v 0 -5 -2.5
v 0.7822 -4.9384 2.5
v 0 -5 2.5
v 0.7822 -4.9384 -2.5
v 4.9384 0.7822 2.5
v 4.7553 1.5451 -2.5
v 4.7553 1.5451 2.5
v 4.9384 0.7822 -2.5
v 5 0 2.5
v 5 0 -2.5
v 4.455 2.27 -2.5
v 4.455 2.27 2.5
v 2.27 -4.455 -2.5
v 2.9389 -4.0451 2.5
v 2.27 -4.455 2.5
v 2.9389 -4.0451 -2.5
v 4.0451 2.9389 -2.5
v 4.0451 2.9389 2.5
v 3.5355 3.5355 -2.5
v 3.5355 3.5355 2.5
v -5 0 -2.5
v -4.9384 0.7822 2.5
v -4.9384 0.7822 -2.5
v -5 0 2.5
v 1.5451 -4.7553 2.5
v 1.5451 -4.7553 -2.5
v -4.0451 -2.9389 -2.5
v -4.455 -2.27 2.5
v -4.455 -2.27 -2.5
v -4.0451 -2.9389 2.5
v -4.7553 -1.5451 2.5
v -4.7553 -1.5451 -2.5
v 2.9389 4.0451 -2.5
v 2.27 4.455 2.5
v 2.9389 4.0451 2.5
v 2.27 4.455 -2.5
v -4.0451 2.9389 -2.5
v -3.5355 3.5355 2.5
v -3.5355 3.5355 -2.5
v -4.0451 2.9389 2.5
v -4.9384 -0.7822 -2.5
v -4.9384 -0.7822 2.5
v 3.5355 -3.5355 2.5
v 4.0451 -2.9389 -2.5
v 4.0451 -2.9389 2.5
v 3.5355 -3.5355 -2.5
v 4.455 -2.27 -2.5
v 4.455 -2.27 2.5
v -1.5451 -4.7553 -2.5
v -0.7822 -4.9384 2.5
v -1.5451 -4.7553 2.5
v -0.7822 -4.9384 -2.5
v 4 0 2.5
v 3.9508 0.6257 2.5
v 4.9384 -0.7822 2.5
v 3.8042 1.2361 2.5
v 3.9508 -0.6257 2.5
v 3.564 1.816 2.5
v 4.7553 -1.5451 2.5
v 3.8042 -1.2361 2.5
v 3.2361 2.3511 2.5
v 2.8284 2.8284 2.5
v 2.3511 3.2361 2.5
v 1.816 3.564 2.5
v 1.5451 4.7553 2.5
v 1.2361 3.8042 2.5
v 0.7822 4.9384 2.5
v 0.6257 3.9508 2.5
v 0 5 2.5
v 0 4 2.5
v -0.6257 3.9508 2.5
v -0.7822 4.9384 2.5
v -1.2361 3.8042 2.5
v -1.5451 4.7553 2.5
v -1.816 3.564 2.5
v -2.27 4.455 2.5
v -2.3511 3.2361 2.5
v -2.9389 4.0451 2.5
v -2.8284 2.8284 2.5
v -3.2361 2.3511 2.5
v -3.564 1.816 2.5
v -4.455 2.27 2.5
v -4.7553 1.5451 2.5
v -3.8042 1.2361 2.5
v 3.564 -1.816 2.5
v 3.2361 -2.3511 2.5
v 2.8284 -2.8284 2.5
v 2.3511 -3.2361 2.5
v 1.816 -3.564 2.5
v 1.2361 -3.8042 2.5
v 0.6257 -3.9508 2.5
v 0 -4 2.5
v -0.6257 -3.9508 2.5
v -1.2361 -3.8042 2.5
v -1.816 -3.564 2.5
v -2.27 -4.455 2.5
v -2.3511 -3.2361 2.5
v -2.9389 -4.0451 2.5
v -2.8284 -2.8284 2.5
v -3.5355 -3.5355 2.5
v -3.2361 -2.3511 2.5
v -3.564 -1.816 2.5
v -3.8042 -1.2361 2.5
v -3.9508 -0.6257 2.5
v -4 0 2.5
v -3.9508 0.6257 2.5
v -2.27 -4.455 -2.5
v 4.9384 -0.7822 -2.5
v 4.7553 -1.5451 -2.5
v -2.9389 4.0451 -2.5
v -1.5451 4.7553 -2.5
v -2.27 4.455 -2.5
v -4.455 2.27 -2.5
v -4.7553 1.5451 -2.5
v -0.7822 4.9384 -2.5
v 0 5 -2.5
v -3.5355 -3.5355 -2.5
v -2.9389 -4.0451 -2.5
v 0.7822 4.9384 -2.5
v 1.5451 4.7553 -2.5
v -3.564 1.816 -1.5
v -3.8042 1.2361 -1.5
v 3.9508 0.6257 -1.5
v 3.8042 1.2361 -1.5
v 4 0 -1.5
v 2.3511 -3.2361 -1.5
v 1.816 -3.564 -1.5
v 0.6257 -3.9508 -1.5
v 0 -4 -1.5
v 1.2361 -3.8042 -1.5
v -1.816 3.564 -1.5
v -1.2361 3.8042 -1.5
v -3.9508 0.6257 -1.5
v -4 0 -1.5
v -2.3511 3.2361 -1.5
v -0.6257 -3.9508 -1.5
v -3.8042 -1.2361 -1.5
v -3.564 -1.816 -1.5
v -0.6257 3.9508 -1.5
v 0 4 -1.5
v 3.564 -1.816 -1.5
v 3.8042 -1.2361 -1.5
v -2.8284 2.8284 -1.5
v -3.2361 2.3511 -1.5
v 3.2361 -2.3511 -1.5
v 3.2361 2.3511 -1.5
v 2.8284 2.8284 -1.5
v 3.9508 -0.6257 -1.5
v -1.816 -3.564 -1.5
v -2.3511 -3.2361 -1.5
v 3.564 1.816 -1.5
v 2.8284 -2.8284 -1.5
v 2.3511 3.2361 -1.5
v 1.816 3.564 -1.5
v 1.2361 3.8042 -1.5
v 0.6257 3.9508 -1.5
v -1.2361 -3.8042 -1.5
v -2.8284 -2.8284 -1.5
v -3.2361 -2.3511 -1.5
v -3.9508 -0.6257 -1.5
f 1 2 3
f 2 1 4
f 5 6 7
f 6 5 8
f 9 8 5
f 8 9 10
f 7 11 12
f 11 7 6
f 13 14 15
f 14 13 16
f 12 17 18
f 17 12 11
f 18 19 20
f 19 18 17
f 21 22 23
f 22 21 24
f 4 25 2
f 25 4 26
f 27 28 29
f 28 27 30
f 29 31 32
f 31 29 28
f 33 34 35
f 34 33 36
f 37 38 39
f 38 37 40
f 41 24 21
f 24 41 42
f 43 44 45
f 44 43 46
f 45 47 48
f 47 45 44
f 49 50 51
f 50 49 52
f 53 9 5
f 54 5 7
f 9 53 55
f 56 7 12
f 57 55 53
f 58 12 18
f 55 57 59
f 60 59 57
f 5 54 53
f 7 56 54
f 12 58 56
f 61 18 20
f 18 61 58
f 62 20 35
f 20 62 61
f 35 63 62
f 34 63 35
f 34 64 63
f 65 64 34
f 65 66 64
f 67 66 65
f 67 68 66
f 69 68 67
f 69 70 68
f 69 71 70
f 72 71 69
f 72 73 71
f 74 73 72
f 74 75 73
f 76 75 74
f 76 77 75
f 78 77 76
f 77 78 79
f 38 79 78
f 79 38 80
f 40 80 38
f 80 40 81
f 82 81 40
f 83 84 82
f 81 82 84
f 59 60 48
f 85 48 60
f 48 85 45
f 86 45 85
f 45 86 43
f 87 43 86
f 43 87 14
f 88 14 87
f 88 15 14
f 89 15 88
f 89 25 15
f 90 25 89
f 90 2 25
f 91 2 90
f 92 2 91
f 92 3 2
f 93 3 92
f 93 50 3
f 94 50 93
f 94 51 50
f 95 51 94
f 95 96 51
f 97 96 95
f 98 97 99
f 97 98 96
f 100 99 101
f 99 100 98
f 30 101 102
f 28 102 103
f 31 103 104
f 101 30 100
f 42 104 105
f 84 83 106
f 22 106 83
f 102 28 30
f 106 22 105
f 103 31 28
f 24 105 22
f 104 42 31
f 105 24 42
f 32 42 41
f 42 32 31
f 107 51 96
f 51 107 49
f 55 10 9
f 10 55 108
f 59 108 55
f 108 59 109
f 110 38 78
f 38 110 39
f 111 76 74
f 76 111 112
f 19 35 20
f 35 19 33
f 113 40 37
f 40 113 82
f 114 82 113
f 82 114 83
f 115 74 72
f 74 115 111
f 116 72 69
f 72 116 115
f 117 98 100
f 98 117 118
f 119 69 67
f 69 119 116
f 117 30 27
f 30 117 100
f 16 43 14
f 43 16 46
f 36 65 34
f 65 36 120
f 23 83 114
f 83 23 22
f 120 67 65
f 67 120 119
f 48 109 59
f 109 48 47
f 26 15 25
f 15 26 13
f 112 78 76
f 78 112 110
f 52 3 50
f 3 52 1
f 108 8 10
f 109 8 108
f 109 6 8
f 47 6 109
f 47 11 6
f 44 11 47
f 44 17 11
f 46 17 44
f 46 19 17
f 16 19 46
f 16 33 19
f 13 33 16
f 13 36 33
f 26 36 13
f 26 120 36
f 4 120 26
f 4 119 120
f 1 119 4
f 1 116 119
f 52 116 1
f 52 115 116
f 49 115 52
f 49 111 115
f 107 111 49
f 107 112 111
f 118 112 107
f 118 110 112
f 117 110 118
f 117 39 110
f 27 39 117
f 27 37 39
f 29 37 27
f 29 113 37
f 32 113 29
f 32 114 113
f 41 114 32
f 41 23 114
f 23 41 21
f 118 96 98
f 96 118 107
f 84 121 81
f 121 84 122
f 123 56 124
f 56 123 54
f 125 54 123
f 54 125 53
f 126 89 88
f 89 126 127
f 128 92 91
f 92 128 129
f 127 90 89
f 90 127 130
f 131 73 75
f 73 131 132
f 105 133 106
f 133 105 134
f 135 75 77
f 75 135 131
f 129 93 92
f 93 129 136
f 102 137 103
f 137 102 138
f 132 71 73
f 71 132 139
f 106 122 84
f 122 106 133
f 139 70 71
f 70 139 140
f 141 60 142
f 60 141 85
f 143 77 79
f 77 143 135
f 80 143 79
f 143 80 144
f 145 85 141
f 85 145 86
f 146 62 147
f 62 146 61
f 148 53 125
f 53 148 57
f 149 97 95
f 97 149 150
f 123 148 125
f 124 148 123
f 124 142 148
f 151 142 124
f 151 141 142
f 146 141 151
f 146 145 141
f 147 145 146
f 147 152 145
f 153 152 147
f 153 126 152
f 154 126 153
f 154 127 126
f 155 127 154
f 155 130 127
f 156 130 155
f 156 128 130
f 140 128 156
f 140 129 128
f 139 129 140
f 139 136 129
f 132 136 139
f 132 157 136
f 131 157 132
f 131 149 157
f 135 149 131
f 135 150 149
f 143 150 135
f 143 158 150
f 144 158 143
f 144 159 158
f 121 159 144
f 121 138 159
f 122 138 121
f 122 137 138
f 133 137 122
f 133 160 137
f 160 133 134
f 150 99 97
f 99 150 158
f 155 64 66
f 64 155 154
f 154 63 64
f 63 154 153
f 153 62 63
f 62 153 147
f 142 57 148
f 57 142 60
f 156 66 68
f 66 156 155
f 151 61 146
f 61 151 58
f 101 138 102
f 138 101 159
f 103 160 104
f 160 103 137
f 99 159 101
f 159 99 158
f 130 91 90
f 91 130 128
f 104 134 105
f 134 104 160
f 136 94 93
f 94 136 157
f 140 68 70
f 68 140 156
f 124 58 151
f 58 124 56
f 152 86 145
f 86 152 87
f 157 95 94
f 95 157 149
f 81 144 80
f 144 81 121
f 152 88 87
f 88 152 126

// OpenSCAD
// Copyright Cledden Obeng-Poku Kwanin and Robert L. Read, 2024
// Released under CERN Strong-reciprocal Open Hardware License

// This is an attempt to make a new parametrized experimental apparatus
// for teting our ferrofluid check valve. It will be similar to the system
// that Veronica design in SolidWorks, but will use the improved, 360 degree design


pot_height = 5;
wall_thickness =1;
outer_rad =5;
inner_rad = 4;
base_scale_factor = 2;
height_scale_factor = 0.5;
extra_height = 3;

finWidth = 0.5;
finLength = outer_rad;
finHeight = 5;


ptype = "flatbottom";
//ptype = "roundbottom";

// set resolution here
$fn=40;

module radialFin(angle) {
    rotate([0,0,angle])
    translate([0,finLength/2,-finHeight/2])
    cube([finWidth,finLength,finHeight],center=true);
}

module radialFins(num) {
    delta = 360 / num;
    for ( i = [0:1:num-1]) {
       radialFin(delta*i);
    }
}
module roundBottomOutside() {
     union () {
        color ("red")
        sphere (outer_rad);
        color("blue")
        cylinder (h=pot_height,r1=outer_rad,r2=outer_rad);
    }
}
module roundBottomPot() {
   difference() {    
        roundBottomOutside();
        union () {
            sphere (r = inner_rad);
            cylinder (h=(pot_height*2),r1 =inner_rad, r2= inner_rad);
        }
    }
}

module roundBottomPotWithFins() {
    roundBottomPot();
    difference() {
        radialFins(16);
        roundBottomOutside();
    }
}

module flatBottomPot () {
    echo("flatBottomPot Called!");
    difference () {
        cylinder (h=    pot_height, r=outer_rad, center = true);
        translate ([0,0,(wall_thickness+(extra_height/2))])
        cylinder (h=pot_height+extra_height, r1=(outer_rad-wall_thickness), r2 =(outer_rad-wall_thickness), center=true);
    }
}

module flatBottomPotOutside () {
    difference () {
        cylinder (h=    pot_height, r=outer_rad, center = true);
    }
}
module flatBottomPotWithFins() {
    flatBottomPot();
    difference() {
        radialFins(16);
        flatBottomPotOutside();
    }
}

module renderPotType(ptype) {
    if (ptype == "flatbottom") {
     flatBottomPot ();
    } else if (ptype == "roundbottom") {
        roundBottomPotWithFins();
    } 
}

difference () {
    renderPotType(ptype);
   translate([200,0,0])
    cube(100,center=true);
}

//difference () {
